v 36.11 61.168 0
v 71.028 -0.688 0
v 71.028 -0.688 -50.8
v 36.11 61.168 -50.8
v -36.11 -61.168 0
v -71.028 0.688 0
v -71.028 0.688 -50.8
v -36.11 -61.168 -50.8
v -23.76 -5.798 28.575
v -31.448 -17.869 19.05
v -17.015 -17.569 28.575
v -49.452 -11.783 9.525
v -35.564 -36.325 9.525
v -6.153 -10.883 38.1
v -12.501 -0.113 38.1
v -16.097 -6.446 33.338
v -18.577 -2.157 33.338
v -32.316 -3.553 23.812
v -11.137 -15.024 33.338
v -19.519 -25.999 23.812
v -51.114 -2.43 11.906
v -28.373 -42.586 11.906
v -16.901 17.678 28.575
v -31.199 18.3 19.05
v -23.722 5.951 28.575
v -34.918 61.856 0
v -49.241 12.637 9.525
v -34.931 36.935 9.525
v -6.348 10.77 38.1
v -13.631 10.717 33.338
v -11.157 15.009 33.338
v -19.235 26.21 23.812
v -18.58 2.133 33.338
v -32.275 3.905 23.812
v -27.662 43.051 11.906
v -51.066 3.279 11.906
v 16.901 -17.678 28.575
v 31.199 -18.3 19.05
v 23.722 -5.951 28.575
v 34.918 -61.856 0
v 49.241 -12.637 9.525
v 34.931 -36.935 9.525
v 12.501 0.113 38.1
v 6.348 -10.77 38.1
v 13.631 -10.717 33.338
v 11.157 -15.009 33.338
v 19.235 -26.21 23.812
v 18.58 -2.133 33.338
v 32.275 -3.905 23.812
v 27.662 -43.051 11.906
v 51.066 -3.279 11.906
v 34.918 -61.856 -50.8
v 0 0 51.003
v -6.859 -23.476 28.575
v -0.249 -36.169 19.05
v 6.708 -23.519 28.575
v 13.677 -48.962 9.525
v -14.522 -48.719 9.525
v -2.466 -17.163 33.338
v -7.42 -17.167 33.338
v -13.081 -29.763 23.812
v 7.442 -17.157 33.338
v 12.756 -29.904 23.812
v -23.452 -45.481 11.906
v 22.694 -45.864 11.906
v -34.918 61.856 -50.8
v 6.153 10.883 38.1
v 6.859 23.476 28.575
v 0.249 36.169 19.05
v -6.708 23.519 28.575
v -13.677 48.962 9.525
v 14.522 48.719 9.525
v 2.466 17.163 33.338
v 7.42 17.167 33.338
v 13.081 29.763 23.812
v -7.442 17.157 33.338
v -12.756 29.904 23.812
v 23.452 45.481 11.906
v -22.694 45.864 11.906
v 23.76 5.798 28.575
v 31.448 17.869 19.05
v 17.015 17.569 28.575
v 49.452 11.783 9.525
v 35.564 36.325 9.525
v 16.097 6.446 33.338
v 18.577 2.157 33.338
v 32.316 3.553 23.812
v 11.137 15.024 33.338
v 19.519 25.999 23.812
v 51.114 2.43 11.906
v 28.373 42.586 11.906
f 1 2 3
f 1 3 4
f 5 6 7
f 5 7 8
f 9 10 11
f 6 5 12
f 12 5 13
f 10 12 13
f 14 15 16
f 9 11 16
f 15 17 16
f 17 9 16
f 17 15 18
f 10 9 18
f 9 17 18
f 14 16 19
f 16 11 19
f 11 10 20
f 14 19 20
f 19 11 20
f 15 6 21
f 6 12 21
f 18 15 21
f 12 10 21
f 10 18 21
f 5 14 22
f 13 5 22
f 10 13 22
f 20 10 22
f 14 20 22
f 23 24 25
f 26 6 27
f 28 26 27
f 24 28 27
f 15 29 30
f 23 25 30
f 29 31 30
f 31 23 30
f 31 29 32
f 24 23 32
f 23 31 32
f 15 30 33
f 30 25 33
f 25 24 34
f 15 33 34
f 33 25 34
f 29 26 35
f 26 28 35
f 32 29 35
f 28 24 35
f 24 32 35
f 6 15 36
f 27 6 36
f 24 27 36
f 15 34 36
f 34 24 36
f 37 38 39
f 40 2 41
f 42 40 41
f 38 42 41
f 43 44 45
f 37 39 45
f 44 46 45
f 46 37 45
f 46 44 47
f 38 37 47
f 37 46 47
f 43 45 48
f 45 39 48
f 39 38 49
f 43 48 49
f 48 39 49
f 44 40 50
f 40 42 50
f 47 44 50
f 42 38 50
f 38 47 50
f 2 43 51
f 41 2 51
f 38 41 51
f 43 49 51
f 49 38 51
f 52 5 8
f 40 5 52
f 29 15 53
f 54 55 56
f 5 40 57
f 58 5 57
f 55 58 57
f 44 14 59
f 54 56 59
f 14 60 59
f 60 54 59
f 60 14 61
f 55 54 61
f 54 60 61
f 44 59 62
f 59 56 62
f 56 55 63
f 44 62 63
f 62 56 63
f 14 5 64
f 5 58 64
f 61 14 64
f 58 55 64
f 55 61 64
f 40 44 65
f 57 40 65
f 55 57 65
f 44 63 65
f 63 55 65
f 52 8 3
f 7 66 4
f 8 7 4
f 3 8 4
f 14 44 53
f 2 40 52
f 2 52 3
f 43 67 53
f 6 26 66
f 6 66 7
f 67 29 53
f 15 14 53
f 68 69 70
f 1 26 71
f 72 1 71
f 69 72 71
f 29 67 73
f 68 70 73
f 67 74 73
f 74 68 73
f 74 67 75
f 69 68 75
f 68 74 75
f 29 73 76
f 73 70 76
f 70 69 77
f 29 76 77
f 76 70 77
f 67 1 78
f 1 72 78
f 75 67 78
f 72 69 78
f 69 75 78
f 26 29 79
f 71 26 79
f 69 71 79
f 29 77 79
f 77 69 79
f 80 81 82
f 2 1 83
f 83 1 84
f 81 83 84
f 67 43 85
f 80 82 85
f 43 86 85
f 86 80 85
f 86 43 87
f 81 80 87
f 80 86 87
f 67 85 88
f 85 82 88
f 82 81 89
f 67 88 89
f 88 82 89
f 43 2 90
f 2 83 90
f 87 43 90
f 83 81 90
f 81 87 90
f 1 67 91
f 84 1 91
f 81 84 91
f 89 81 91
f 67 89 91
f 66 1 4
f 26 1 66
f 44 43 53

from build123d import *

# Parameters (mm, degrees)
F2_DEPTH = 50.8
F5_DEPTH = 50.8
F5_TAPER = 40


with BuildPart() as f2:
    # F1 (on Top) → F2 (new body)
    with BuildSketch(Plane.XY):
        Polygon((71.0278424351, -0.688096386), (36.109830168, 61.1678677318), (-34.9180122671, 61.8559641178), (-71.0278424351, 0.688096386), (-36.109830168, -61.1678677318), (34.9180122671, -61.8559641178), align=None)
    extrude(amount=-F2_DEPTH)

    # F3 (on offset) → F4 section 0
    with BuildSketch(Plane.XY.offset(38.1)):
        Polygon((6.3483007252, -10.7696512714), (12.5009419535, 0.1129640632), (6.1526412283, 10.8826153346), (-6.3483007252, 10.7696512714), (-12.5009419535, -0.1129640632), (-6.1526412283, -10.8826153346), align=None)
    # F2_face (on face) → F4 section 1
    with BuildSketch(Plane.XY):
        Polygon((71.0278424351, -0.688096386), (36.109830168, 61.1678677318), (-34.9180122671, 61.8559641178), (-71.0278424351, 0.688096386), (-36.109830168, -61.1678677318), (34.9180122671, -61.8559641178), align=None)
    loft()

    # F4_face (on face) → F5 (join)
    with BuildSketch(Plane.XY.offset(38.1)):
        Polygon((-6.1526412283, -10.8826153346), (6.3483007252, -10.7696512714), (12.5009419535, 0.1129640632), (6.1526412283, 10.8826153346), (-6.3483007252, 10.7696512714), (-12.5009419535, -0.1129640632), align=None)
    extrude(amount=F5_DEPTH, taper=F5_TAPER)


solid = f2.part
